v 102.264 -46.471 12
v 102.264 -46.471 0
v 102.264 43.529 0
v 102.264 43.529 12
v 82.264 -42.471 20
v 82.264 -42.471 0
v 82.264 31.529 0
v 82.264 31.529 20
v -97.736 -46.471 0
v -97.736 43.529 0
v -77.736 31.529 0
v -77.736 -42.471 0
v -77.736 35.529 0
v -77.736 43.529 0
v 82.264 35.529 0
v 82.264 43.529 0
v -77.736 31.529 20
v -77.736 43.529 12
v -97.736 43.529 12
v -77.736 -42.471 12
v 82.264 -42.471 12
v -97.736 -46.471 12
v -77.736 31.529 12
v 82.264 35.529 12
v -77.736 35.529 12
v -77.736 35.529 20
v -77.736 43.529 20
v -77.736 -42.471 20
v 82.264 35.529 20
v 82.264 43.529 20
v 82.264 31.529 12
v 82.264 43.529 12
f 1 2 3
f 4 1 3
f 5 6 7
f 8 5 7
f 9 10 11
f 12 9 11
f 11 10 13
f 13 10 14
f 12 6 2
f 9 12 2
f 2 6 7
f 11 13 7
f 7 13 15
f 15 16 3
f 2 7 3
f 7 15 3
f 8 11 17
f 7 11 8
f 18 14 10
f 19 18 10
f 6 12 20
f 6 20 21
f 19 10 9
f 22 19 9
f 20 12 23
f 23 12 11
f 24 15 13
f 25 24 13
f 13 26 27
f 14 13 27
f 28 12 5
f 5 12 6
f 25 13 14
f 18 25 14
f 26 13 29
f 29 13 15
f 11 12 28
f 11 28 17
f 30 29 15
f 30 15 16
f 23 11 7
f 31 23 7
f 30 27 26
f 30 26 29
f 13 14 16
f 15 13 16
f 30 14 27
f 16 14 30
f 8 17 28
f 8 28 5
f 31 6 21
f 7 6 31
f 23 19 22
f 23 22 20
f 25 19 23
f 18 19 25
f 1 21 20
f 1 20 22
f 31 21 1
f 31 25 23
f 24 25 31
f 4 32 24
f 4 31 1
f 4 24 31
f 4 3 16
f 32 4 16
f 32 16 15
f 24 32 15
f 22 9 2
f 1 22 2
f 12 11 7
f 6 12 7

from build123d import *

# Parameters (mm, degrees)
F0_W     = 160
F0_H     = 8
F0_H_2   = 74
F1_DEPTH = 20
F2_DEPTH = 12


with BuildPart() as f1:
    # F0 (on Top) → F1 (new body)
    with BuildSketch(Plane.XY):
        with Locations((2.263863, 39.528583)):
            Rectangle(F0_W, F0_H)
        with Locations((2.263863, -5.471417)):
            Rectangle(F0_W, F0_H_2)
    extrude(amount=F1_DEPTH)


with BuildPart() as f2:
    # F0 (on Top) → F2 (new body)
    with BuildSketch(Plane.XY):
        Polygon((-77.736137, 43.528583), (-97.736137, 43.528583), (-97.736137, -46.471417), (102.263863, -46.471417), (102.263863, 43.528583), (82.263863, 43.528583), (82.263863, 35.528583), (-77.736137, 35.528583), align=None)
        with Locations((2.263863, -5.471417)):
            Rectangle(F0_W, F0_H_2, mode=Mode.SUBTRACT)
    extrude(amount=F2_DEPTH)


solid = Compound([f1.part, f2.part])
